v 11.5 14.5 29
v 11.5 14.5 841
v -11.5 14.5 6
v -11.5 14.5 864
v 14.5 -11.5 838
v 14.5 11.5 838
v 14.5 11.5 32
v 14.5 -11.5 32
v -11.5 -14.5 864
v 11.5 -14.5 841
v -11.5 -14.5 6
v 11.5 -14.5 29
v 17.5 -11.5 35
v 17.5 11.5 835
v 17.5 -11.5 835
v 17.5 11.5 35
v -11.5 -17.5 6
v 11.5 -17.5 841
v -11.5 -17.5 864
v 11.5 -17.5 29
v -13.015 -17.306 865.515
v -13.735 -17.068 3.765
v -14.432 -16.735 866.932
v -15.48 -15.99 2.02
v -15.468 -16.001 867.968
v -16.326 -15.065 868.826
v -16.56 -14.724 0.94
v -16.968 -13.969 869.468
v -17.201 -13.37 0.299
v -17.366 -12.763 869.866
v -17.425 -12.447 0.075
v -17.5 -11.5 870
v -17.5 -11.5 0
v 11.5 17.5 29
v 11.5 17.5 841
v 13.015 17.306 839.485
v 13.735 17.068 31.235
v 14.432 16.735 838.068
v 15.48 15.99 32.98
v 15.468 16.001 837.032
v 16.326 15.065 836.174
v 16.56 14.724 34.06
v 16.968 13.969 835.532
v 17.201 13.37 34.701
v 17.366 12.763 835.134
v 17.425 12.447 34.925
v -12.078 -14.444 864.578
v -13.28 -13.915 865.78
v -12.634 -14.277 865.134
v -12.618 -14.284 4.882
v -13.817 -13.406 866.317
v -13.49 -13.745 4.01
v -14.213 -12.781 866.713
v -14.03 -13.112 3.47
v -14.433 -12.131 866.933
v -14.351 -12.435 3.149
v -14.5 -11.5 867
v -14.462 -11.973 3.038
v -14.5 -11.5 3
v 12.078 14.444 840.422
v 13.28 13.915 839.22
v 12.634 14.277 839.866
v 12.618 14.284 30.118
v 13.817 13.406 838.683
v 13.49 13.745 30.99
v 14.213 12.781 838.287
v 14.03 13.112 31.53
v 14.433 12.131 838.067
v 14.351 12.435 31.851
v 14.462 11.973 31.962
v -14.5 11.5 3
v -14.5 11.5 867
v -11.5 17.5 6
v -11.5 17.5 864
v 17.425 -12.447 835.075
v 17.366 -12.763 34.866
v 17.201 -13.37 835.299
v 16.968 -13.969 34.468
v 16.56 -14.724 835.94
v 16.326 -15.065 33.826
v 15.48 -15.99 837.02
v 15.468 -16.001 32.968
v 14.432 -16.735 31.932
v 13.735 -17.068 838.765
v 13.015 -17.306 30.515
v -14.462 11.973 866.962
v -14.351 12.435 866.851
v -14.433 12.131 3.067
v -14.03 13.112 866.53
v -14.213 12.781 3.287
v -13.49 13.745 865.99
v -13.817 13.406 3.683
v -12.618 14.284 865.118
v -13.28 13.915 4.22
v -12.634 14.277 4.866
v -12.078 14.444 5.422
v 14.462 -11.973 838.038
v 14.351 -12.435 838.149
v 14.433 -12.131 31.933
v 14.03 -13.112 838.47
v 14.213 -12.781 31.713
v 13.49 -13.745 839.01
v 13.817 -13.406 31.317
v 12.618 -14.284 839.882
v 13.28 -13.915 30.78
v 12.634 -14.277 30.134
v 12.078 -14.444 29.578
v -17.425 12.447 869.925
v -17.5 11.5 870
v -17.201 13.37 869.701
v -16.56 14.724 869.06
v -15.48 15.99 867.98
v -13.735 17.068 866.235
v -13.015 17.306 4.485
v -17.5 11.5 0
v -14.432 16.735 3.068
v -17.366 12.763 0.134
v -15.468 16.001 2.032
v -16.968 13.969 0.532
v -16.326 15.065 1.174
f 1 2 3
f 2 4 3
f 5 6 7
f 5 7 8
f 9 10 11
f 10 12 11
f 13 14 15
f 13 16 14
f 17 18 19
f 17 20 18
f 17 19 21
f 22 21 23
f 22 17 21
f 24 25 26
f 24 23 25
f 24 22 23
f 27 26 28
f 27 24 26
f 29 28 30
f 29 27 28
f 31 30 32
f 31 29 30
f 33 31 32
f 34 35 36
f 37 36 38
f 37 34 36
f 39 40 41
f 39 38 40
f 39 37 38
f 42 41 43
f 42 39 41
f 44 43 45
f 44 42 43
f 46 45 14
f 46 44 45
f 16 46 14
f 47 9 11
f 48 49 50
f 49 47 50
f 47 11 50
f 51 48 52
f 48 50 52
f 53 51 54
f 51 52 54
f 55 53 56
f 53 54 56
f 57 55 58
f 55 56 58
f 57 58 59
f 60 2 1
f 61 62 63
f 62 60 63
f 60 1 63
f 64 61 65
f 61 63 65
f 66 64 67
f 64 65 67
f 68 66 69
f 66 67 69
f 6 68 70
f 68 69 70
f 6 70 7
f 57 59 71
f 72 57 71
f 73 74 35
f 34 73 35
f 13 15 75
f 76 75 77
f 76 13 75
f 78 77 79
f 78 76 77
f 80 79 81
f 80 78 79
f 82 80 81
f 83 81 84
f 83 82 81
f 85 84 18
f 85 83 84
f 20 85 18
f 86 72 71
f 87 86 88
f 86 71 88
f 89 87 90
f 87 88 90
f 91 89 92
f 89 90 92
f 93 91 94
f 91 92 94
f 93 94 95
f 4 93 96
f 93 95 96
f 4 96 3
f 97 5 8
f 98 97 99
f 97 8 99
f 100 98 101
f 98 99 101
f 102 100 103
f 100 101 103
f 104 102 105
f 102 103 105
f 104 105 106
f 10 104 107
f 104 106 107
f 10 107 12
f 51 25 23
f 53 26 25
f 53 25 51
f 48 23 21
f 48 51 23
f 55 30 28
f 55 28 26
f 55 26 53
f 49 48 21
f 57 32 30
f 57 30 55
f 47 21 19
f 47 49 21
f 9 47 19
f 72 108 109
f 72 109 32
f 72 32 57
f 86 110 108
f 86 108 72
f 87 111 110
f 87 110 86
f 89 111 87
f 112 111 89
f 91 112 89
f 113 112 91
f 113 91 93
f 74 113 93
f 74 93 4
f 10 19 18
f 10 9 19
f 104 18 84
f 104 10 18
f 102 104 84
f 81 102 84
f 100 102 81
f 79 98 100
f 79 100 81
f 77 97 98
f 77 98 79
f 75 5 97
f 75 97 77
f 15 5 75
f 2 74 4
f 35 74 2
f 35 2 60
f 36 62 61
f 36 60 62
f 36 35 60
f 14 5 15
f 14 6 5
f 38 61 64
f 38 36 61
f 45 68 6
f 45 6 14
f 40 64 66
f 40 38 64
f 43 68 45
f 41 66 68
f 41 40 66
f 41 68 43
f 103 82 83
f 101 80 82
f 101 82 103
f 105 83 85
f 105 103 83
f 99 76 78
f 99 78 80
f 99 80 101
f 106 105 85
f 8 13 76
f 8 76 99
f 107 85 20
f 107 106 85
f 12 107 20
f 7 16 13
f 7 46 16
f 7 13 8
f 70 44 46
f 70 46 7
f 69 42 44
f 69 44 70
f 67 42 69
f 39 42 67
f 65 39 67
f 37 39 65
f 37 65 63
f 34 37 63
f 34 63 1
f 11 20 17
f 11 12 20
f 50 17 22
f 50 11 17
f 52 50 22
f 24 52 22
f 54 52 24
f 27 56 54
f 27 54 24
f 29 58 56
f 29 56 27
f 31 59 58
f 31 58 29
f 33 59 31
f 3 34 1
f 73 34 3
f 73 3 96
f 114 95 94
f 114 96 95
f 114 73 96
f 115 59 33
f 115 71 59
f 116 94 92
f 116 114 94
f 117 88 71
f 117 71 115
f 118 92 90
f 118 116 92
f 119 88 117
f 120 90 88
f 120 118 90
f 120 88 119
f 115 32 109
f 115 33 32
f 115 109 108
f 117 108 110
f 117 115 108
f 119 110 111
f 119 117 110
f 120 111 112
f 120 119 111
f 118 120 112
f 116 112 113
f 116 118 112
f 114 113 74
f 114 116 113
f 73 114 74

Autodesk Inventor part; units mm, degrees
ref_plane "Počáteční rovina" through (0, 0, 0) normal (0, 0, 1) x (1, 0, 0)
ref_plane "Koncová rovina" through (0, 0, 875) normal (0, 0, 1) x (1, 0, 0)
sketch "Náčrt1" plane through (0, 0, 0) normal (0, 0, 1) x (1, 0, 0)
  line L0 (-11.5, 17.5) -> (11.5, 17.5)
  line L1 (17.5, 11.5) -> (17.5, -11.5)
  line L2 (11.5, -17.5) -> (-11.5, -17.5)
  line L3 (-17.5, -11.5) -> (-17.5, 11.5)
  arc A0 (-11.5, 17.5) -> (-17.5, 11.5) centre (-11.5, 11.5) ccw
  arc A1 (17.5, 11.5) -> (11.5, 17.5) centre (11.5, 11.5) ccw
  arc A2 (11.5, -17.5) -> (17.5, -11.5) centre (11.5, -11.5) ccw
  arc A3 (-17.5, -11.5) -> (-11.5, -17.5) centre (-11.5, -11.5) ccw
  line L4 (-26.2397, 0) -> (26.2397, 0) construction
  line L5 (0, -26.2397) -> (0, 26.2397) construction
  arc A4 (-11.5, 14.5) -> (-14.5, 11.5) centre (-11.5, 11.5) ccw
  line L6 (-11.5, 14.5) -> (11.5, 14.5)
  arc A5 (14.5, 11.5) -> (11.5, 14.5) centre (11.5, 11.5) ccw
  line L7 (14.5, 11.5) -> (14.5, -11.5)
  arc A6 (11.5, -14.5) -> (14.5, -11.5) centre (11.5, -11.5) ccw
  line L8 (11.5, -14.5) -> (-11.5, -14.5)
  arc A7 (-14.5, -11.5) -> (-11.5, -14.5) centre (-11.5, -11.5) ccw
  line L9 (-14.5, -11.5) -> (-14.5, 11.5)
  point P0 (-17.5, 17.5)
  point P1 (17.5, -17.5)
  point P2 (17.5, 17.5)
  dimension "b" = 35
  dimension "msp_r" = 6
  dimension "d8" = 17.5
  dimension "d9" = 17.5
  dimension "d10" = 3
extrude "Těleso" add sketch "Náčrt1" along normal blind 870
sketch "Sketch2" plane through (0, 0, 0) normal (0, 0, 1) x (1, 0, 0)
  line L0 (0, 0) -> (10, 0)
ref_plane "Work Plane3" through (0, 0, 0) normal (0, -1, 0) x (1, 0, 0)
sketch "Sketch3" plane through (0, 0, 0) normal (0, -1, 0) x (1, 0, 0)
  line L0 (-2, 0) -> (12, 0)
  line L1 (-2, 875) -> (12, 875)
  dimension "d14" = 875
sketch "Náčrt4" plane through (11.5, 17.5, 875) normal (0, 1, 0) x (1, 0, 0)
  line L0 (-29, 875) -> (-29, 5) construction
  line L1 (6, 875) -> (6, 5) construction
  line L2 (-29, 875) -> (6, 875)
  line L3 (6, 875) -> (6, 840)
  line L4 (-29, 875) -> (-29, 5) construction
  line L5 (6, 840) -> (-29, 875)
  line L6 (6, 875) -> (6, 5) construction
  line L7 (-23, 5) -> (-29, 5) projected
  line L8 (-29, 5) -> (6, 40)
  line L9 (6, 40) -> (6, 5)
  line L10 (6, 5) -> (-29, 5)
  point P0 (-11.5, 875)
  dimension "d15" = 45
  dimension "d19" = 45
extrude "Vysunutí2" cut sketch "Náčrt4" against normal through all
ref_plane "Pracovní rovina4" through (417.5, -11.5, 435) normal (0, 0, 1) x (0, -1, 0)
equation "\"msp_r\" = 2 * ParT"
equation "\"d8\" = d9"
equation "\"d9\" = 0.5 * b"
equation "\"d10\" = ParT"
equation "\"G_OFFSET_START\" = 0"
equation "\"G_OFFSET_END\" = 0"
equation "\"d12\" = G_OFFSET_END + B_L"
equation "\"G_L\" = d14"
equation "\"B_L\" = 875"
equation "\"PoloměrOhybu\" = Tloušťka"
equation "\"ŠířkaVýštipu\" = Tloušťka"
equation "\"HloubkaVýštipu\" = 0.5 * Tloušťka"
equation "\"VelikostRohovéhoVýštipu\" = 4 * Tloušťka"
equation "\"MinimálníZbytek\" = 2 * Tloušťka"
equation "\"PřechodovýPoloměr\" = PoloměrOhybu"
equation "\"VelikostJacobihoPoloměru\" = Tloušťka"
equation "\"VelikostMezery\" = Tloušťka"
equation "\"ParT\" = 3"
equation "\"Tloušťka\" = 0.5"
properties part number "DD_KVD_003_02" material "Nerezová ocel"
